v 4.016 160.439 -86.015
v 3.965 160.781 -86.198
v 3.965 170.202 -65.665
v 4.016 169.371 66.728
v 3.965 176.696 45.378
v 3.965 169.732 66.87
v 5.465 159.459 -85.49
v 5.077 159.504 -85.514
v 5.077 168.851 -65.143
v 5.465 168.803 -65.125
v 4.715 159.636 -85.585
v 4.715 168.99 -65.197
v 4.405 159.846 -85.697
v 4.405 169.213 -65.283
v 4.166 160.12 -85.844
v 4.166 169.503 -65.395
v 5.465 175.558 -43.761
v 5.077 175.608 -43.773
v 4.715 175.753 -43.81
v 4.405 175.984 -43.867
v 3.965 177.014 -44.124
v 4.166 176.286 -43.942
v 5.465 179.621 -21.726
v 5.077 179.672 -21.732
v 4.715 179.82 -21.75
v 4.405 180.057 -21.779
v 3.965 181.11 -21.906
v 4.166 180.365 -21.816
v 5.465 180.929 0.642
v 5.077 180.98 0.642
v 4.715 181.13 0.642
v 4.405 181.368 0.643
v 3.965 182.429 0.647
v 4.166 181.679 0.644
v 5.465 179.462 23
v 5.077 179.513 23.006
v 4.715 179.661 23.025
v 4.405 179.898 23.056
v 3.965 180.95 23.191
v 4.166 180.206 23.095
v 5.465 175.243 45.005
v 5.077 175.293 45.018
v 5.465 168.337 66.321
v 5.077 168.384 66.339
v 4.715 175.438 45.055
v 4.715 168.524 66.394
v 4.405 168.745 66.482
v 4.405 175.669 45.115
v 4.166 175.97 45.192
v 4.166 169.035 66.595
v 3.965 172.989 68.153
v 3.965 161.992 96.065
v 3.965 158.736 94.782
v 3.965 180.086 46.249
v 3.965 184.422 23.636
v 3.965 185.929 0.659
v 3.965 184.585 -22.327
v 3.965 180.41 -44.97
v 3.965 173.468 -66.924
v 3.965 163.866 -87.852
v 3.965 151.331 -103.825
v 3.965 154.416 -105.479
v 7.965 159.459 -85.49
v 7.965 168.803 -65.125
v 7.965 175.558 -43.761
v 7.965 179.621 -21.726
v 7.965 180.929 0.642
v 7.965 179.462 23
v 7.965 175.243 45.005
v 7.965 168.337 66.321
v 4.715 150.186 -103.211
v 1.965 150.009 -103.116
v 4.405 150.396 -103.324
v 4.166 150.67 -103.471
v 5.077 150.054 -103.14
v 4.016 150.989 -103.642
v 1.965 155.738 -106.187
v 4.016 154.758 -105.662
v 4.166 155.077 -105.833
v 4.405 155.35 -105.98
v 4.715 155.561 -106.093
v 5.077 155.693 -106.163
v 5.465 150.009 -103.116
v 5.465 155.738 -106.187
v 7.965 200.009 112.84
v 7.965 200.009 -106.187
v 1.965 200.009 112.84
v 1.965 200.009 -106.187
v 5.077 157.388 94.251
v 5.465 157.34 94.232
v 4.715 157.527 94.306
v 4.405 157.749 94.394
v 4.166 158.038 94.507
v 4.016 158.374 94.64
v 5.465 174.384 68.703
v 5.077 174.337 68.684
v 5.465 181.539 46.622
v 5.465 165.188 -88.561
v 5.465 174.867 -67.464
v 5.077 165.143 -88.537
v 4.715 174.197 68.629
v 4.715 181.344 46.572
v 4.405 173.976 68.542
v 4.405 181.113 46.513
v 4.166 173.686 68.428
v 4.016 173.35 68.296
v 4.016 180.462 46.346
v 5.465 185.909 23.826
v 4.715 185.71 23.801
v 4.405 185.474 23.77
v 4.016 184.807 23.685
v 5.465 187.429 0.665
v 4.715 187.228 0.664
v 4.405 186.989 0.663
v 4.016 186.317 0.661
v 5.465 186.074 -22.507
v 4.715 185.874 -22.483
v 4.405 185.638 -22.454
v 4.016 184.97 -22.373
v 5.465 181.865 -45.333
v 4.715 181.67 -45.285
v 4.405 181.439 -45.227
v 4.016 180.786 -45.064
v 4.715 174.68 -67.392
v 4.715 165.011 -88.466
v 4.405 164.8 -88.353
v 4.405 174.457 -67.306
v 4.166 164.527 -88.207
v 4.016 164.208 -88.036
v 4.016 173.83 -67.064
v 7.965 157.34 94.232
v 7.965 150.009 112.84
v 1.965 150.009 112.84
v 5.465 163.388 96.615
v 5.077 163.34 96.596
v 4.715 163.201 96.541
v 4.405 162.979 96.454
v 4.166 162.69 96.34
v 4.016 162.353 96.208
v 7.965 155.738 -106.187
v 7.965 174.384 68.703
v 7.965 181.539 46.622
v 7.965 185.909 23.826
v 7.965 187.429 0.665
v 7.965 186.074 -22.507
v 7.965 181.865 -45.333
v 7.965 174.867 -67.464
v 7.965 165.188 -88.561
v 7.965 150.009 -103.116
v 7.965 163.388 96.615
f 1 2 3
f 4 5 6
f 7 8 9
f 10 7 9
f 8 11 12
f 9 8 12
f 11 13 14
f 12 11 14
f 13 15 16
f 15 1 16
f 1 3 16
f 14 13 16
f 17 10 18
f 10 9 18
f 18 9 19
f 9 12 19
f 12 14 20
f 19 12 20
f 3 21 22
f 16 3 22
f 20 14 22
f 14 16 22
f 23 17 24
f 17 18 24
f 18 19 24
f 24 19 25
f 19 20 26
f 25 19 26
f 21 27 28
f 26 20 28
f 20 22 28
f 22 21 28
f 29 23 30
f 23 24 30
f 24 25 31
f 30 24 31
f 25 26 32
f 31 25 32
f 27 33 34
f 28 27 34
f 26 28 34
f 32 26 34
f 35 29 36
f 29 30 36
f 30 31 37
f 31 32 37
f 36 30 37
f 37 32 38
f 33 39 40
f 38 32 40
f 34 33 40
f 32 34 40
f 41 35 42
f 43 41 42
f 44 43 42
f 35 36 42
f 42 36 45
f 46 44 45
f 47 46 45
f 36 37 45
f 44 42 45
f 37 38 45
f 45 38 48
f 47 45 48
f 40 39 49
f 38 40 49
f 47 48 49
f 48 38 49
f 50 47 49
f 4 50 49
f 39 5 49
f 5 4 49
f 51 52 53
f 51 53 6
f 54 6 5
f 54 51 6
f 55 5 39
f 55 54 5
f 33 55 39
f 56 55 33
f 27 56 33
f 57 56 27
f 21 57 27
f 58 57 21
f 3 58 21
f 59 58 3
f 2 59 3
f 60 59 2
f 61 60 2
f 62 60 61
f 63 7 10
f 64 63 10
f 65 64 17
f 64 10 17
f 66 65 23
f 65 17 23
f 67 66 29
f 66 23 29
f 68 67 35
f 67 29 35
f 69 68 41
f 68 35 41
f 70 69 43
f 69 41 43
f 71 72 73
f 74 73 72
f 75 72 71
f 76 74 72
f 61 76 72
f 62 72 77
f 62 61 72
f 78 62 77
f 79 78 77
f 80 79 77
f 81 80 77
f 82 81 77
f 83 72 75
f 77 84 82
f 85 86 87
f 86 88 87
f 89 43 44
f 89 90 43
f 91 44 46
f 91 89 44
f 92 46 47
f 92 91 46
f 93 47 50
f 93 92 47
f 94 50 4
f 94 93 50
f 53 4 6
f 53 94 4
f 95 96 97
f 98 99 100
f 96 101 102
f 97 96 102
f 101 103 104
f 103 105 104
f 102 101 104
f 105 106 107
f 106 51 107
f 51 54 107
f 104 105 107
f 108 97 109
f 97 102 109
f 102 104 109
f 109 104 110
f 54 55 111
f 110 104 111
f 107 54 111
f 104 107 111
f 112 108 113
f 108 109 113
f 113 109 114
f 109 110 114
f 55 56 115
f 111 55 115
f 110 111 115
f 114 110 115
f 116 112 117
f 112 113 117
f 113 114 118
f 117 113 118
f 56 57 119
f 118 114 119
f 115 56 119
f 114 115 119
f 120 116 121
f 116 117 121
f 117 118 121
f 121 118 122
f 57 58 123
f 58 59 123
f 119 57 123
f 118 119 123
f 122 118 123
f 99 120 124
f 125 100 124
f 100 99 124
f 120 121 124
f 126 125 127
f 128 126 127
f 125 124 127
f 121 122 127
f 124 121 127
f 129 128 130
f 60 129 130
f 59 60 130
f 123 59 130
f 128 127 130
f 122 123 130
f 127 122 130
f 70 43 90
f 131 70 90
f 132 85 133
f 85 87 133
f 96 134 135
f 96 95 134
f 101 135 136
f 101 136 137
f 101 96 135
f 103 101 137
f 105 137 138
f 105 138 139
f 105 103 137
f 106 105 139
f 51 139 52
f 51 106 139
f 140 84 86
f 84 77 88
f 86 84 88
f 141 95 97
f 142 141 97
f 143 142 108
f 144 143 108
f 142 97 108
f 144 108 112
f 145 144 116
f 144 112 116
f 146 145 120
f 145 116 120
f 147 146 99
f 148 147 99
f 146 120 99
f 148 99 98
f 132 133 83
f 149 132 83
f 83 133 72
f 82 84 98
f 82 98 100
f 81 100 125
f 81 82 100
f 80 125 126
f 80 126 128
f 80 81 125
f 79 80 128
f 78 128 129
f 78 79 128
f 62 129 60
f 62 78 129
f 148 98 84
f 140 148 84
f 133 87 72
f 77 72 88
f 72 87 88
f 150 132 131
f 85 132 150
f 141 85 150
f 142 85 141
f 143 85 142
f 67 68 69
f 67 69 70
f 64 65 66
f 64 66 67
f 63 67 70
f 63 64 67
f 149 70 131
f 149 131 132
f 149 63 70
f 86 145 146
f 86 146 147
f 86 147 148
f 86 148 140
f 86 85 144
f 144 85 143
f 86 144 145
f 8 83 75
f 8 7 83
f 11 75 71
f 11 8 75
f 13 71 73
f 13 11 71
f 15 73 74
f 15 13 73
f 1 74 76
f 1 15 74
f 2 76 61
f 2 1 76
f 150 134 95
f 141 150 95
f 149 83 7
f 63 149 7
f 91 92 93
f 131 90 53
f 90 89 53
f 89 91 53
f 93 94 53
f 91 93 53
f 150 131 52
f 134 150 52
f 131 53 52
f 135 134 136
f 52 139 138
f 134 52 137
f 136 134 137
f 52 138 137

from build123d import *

# Parameters (mm, degrees)
RESSALTO_EXTRUS_O1_DEPTH = 2
RESSALTO_EXTRUS_O2_DEPTH = 4
FILETE1_R                = 1.5


with BuildPart() as part:
    # Esboço2 → Ressalto-extrusão1 (new body)
    with BuildSketch(Plane(origin=(3.965165603, 1.072526679, 0.020251395), x_dir=(0, 0, 1), z_dir=(-1, 0, 0))):
        Polygon((-106.20773335, 198.936503302), (-106.20773335, 154.66514884), (-103.13647623, 148.936503302), (112.820148392, 148.936503302), (112.820148392, 198.936503302), align=None)
    extrude(amount=RESSALTO_EXTRUS_O1_DEPTH)

    # Esboço2<3> → Ressalto-extrusão2 (add)
    with BuildSketch(Plane(origin=(3.965165603, 1.072526679, 0.020251395), x_dir=(0, 0, 1), z_dir=(-1, 0, 0))):
        with BuildLine():
            Line((-85.509874573, 158.386525208), (-103.13647623, 148.936503302))
            Line((-103.13647623, 148.936503302), (112.820148392, 148.936503302))
            Line((112.820148392, 148.936503302), (112.820148392, 198.936503302))
            Line((112.820148392, 198.936503302), (-106.20773335, 198.936503302))
            Line((-106.20773335, 198.936503302), (-106.20773335, 154.66514884))
            Line((-106.20773335, 154.66514884), (-88.581131693, 164.115170747))
            ThreePointArc((-88.581131693, 164.115170747), (-10.962219944, 186.037810353), (68.682901646, 173.31176637))
            Line((68.682901646, 173.31176637), (96.594808979, 162.315156482))
            Line((96.594808979, 162.315156482), (94.21221017, 156.26757656))
            Line((94.21221017, 156.26757656), (66.300302837, 167.264186448))
            ThreePointArc((66.300302837, 167.264186448), (-10.582756701, 179.548896141), (-85.509874573, 158.386525208))
        make_face()
    extrude(amount=-RESSALTO_EXTRUS_O2_DEPTH)

    # Filete1
    filete1_edges = [part.edges().sort_by_distance(p)[0] for p in [
        (3.965165603, 154.734040934, -94.302924007),
        (3.965165603, 160.462686473, -97.374181126),
        (3.965165603, 180.62142282, -10.562505306),
        (3.965165603, 162.838408183, 80.276507899),
        (3.965165603, 168.885988105, 82.659106708),
        (3.965165603, 187.110337032, -10.941968548),
    ]]
    fillet(filete1_edges, radius=FILETE1_R)


solid = part.part
